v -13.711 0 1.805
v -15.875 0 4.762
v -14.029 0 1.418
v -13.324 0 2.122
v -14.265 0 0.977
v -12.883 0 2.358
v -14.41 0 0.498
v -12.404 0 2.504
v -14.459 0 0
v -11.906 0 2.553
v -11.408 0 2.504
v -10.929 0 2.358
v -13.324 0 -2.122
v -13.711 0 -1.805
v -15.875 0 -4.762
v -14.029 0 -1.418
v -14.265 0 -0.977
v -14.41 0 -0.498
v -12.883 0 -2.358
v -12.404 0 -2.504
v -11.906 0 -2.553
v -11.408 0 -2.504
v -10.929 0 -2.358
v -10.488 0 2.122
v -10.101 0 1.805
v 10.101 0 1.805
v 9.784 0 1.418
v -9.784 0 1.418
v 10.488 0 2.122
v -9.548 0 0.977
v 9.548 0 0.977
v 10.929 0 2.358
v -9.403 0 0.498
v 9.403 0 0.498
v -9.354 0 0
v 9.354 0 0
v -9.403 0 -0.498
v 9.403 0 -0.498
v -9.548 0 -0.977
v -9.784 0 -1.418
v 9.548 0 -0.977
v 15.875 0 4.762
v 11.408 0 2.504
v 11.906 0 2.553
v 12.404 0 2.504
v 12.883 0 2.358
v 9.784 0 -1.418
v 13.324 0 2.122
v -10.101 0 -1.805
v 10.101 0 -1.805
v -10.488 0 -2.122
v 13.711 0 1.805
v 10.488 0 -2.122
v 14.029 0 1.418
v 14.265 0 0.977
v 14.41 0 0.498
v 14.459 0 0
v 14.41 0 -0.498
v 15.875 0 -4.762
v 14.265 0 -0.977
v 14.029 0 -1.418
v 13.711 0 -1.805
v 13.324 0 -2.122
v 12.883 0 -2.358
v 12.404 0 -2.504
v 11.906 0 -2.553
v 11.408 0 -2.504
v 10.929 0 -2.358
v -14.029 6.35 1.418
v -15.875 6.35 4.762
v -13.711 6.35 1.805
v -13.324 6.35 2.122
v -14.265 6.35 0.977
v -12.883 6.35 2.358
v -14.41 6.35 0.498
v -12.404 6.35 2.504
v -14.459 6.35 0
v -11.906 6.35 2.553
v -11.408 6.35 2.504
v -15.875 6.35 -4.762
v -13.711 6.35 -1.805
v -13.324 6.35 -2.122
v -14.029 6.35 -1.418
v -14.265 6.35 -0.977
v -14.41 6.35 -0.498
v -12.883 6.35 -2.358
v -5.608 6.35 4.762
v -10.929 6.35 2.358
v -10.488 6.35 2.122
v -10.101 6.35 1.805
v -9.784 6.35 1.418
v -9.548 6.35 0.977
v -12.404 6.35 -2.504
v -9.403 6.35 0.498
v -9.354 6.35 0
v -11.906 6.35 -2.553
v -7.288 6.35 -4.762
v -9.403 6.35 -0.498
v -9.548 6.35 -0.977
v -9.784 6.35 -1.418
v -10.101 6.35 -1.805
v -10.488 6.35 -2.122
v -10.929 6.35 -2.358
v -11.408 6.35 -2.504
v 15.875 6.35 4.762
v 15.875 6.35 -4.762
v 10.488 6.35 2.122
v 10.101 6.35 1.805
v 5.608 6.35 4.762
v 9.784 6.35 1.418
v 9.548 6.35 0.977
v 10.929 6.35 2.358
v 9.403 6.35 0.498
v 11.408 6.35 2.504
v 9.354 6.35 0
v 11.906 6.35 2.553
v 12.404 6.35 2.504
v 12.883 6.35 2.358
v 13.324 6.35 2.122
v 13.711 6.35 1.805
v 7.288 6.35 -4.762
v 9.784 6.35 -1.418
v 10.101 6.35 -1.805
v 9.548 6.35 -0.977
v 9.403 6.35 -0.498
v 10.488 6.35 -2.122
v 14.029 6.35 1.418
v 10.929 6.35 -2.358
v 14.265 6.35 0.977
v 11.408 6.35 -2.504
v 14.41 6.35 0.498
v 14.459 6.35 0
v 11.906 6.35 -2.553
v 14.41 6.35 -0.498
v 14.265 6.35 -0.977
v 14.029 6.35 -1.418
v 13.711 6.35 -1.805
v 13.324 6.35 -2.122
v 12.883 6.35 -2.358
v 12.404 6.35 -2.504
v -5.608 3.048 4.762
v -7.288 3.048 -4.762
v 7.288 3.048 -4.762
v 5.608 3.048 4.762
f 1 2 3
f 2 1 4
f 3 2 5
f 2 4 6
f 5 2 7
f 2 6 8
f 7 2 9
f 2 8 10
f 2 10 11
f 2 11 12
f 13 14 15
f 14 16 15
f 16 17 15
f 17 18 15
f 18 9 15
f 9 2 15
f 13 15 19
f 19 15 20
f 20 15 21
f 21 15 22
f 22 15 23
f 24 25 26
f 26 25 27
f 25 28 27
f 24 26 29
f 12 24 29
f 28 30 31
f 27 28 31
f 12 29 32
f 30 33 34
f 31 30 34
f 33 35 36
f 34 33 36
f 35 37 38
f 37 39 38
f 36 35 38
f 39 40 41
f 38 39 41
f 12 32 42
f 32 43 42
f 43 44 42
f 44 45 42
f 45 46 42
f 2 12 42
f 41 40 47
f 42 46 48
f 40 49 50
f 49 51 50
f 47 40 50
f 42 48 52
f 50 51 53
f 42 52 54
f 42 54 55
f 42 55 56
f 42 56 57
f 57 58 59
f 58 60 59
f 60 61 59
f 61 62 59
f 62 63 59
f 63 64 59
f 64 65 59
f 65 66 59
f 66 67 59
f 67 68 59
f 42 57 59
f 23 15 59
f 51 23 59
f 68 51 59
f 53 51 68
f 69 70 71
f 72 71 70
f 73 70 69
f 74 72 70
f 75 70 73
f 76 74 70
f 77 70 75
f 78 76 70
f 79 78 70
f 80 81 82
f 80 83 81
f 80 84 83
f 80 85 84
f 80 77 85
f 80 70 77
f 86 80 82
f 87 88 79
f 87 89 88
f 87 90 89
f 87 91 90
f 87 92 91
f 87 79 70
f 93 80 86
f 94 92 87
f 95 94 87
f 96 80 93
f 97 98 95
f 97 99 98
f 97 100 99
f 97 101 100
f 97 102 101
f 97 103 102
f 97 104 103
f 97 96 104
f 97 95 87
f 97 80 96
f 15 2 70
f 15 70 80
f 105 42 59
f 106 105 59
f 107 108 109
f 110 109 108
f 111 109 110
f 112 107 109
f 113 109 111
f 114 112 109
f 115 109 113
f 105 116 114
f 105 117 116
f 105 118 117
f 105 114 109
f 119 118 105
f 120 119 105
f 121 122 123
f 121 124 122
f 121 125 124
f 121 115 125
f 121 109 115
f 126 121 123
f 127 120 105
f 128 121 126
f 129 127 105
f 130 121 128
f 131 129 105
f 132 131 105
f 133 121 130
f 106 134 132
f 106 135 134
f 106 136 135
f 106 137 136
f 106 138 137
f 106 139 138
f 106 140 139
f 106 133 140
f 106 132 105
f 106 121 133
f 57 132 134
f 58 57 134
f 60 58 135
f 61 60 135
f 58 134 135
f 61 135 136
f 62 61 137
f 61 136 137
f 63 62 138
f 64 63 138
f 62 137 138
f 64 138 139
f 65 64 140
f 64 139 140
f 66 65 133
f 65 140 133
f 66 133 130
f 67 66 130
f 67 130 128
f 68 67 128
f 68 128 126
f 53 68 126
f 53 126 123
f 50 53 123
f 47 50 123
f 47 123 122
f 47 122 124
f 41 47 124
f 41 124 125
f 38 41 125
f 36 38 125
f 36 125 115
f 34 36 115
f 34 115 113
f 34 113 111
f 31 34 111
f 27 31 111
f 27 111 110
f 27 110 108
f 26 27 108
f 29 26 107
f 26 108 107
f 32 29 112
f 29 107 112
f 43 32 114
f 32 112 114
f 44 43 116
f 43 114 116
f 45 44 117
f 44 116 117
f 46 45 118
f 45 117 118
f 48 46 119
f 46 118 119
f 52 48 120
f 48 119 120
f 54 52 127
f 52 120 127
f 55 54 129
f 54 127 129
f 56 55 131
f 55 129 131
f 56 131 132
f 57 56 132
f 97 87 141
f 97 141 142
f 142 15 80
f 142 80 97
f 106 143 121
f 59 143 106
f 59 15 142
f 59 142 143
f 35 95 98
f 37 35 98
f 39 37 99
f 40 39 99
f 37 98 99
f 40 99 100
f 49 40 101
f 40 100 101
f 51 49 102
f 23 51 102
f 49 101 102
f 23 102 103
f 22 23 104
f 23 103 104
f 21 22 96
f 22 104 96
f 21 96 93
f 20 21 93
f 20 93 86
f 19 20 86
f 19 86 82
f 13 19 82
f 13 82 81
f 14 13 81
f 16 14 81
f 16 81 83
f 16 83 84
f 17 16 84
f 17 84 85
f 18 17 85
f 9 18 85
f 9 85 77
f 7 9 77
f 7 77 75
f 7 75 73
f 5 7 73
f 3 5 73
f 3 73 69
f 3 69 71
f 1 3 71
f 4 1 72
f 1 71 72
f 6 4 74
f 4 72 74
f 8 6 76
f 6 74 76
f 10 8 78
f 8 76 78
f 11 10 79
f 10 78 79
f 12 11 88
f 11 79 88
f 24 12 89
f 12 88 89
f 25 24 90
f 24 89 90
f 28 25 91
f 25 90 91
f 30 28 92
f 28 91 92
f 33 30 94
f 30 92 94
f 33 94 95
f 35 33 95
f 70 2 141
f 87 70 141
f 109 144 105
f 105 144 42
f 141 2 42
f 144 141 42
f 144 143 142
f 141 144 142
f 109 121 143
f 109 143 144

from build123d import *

# Parameters (mm, degrees)
SKETCH1_W                  = 31.75
SKETCH1_H                  = 9.525
BOSS_EXTRUDE1_DEPTH        = 6.35
F_10_CLEARANCE_HOLE1_D     = 5.1054
F_10_CLEARANCE_HOLE1_DEPTH = 19.05
F_10_CLEARANCE_HOLE1_TIP   = 1.533816902
CUT_EXTRUDE1_DEPTH         = 3.302


with BuildPart() as part:
    # Sketch1 → Boss-Extrude1 (new body)
    with BuildSketch(Plane(origin=(0, 0, 0), x_dir=(1, 0, 0), z_dir=(0, 1, 0))):
        Rectangle(SKETCH1_W, SKETCH1_H)
    extrude(amount=BOSS_EXTRUDE1_DEPTH)

    # #10 Clearance Hole1
    with Locations(Plane(origin=(0, 0, 0), x_dir=(-1, 0, 0), z_dir=(0, -1, 0))):
        with Locations((11.90625, 0), (-11.90625, 0)):
            Hole(F_10_CLEARANCE_HOLE1_D / 2, depth=F_10_CLEARANCE_HOLE1_DEPTH)
            with Locations((0, 0, -(F_10_CLEARANCE_HOLE1_DEPTH + F_10_CLEARANCE_HOLE1_TIP / 2))):  # 118° drill point
                Cone(0, F_10_CLEARANCE_HOLE1_D / 2, F_10_CLEARANCE_HOLE1_TIP, mode=Mode.SUBTRACT)

    # Sketch4 → Cut-Extrude1 (cut)
    with BuildSketch(Plane(origin=(0, 6.35, 0), x_dir=(1, 0, 0), z_dir=(0, 1, 0))):
        Polygon((7.287716231, 4.7625), (5.60820174, -4.7625), (-5.60820174, -4.7625), (-7.287716231, 4.7625), align=None)
    extrude(amount=-CUT_EXTRUDE1_DEPTH, mode=Mode.SUBTRACT)


solid = part.part
